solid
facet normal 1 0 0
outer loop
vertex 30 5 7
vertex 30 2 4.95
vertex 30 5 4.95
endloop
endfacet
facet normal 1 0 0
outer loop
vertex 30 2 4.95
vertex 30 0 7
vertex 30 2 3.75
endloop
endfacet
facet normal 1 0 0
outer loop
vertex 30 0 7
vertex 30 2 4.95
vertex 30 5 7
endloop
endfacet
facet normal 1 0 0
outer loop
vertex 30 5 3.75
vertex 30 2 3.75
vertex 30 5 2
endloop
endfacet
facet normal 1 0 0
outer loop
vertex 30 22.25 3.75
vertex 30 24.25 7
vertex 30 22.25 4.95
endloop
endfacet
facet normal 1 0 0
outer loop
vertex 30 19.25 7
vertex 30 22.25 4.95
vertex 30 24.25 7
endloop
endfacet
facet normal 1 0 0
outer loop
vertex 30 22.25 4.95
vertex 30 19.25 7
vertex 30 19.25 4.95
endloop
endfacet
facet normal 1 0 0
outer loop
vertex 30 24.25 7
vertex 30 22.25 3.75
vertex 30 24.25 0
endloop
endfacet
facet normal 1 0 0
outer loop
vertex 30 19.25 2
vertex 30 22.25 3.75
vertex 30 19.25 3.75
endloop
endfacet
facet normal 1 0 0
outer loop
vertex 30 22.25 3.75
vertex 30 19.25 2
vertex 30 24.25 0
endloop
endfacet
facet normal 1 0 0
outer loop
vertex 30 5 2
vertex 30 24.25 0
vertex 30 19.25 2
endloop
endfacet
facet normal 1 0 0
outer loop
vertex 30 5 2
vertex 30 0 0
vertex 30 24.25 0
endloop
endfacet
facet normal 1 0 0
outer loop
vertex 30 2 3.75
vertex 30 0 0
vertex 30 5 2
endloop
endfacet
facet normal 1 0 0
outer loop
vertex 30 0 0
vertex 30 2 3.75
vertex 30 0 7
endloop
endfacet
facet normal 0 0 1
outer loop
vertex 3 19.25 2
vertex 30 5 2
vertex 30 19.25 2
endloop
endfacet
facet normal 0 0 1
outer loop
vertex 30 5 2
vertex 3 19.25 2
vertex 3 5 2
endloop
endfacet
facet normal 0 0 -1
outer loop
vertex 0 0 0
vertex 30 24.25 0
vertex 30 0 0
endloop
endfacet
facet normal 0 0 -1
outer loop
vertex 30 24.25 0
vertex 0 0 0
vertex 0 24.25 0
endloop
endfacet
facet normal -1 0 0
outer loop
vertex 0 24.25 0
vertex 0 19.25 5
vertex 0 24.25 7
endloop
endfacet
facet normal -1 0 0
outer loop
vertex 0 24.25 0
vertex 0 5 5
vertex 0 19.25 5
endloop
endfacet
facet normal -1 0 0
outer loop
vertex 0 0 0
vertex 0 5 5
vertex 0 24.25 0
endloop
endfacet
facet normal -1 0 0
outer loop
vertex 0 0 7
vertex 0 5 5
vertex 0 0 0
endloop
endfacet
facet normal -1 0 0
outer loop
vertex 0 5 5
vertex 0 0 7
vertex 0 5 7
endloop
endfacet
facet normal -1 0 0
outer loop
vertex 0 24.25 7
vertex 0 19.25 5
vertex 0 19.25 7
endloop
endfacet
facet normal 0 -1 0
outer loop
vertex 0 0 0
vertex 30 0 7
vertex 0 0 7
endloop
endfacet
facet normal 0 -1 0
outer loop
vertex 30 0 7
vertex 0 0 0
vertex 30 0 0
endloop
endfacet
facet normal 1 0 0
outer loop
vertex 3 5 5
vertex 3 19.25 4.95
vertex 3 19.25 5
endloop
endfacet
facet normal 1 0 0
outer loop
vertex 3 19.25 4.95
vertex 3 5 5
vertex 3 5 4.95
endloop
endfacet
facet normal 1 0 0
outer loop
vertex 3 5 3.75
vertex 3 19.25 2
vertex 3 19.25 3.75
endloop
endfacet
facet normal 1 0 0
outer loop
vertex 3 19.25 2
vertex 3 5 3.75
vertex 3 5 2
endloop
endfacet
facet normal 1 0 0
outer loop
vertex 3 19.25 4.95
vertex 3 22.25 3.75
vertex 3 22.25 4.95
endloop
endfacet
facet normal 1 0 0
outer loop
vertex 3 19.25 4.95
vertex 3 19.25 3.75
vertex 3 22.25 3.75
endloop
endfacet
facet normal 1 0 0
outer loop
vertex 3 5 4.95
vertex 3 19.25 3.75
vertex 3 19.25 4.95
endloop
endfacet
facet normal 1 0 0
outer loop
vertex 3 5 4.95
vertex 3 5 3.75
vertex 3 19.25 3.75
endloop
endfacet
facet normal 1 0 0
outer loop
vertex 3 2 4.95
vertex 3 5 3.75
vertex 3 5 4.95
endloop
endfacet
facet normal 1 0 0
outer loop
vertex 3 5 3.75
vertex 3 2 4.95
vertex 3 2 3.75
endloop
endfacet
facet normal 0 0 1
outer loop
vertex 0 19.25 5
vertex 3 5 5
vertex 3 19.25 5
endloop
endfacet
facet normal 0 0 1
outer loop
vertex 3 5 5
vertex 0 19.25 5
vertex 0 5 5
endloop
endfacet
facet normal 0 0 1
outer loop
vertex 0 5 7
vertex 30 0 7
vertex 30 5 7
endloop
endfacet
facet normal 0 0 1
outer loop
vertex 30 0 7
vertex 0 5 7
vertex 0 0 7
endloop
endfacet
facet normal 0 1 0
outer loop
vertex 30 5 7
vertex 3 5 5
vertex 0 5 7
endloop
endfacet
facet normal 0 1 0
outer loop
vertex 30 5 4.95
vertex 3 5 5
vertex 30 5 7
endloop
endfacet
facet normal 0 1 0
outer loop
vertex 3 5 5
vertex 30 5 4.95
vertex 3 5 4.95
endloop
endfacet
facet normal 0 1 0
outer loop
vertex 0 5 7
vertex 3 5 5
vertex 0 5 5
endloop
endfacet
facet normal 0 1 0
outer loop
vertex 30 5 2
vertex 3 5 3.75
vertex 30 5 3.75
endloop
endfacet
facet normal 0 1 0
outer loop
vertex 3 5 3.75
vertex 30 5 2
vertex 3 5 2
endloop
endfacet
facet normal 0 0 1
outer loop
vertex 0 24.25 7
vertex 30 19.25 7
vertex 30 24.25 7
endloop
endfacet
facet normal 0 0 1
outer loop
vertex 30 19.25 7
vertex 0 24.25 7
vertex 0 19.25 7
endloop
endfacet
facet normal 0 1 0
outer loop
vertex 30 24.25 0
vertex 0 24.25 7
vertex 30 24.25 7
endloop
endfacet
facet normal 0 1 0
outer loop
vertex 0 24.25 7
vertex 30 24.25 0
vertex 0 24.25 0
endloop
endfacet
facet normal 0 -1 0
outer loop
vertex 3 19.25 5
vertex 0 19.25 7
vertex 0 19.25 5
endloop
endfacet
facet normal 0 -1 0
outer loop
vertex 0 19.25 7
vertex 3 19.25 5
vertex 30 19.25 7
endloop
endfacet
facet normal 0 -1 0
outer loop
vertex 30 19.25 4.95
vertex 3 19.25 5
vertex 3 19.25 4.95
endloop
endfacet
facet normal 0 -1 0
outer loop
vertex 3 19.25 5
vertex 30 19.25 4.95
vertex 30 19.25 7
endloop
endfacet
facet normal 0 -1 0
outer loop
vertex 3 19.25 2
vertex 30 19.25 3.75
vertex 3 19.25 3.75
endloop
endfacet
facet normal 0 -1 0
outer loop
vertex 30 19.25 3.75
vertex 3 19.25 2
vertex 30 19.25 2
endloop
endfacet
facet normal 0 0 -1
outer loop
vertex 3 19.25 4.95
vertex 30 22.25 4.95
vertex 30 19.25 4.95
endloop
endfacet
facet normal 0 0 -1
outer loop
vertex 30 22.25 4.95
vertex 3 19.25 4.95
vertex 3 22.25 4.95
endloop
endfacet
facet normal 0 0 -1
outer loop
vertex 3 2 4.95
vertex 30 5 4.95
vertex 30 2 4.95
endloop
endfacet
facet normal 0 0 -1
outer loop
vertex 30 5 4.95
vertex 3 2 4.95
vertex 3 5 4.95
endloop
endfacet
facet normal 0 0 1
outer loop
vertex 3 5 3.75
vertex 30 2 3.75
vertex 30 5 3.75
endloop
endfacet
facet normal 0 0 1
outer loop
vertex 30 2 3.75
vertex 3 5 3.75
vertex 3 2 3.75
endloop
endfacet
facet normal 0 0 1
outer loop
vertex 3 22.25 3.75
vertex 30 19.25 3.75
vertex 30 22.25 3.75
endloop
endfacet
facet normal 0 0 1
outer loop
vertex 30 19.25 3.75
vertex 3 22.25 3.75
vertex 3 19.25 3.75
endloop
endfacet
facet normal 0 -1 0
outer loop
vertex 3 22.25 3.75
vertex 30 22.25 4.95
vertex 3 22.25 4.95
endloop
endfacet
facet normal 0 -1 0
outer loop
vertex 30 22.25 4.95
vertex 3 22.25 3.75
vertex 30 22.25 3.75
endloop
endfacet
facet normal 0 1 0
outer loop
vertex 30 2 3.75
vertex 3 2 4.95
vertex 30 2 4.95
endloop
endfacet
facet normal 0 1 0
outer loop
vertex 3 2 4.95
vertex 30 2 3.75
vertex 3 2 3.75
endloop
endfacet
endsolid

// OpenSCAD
length = 30;

difference(){
union(){
//base
cube([length,23,2]);

//back
cube([3,23,5]);

cube([length, 5, 7]);

translate(v = [0,19.25,0]) {
cube([length, 5, 7]);
}
}

translate(v = [3,2,3.75]) {
cube([length, 20.25,1.2]);
 }
 
 }
